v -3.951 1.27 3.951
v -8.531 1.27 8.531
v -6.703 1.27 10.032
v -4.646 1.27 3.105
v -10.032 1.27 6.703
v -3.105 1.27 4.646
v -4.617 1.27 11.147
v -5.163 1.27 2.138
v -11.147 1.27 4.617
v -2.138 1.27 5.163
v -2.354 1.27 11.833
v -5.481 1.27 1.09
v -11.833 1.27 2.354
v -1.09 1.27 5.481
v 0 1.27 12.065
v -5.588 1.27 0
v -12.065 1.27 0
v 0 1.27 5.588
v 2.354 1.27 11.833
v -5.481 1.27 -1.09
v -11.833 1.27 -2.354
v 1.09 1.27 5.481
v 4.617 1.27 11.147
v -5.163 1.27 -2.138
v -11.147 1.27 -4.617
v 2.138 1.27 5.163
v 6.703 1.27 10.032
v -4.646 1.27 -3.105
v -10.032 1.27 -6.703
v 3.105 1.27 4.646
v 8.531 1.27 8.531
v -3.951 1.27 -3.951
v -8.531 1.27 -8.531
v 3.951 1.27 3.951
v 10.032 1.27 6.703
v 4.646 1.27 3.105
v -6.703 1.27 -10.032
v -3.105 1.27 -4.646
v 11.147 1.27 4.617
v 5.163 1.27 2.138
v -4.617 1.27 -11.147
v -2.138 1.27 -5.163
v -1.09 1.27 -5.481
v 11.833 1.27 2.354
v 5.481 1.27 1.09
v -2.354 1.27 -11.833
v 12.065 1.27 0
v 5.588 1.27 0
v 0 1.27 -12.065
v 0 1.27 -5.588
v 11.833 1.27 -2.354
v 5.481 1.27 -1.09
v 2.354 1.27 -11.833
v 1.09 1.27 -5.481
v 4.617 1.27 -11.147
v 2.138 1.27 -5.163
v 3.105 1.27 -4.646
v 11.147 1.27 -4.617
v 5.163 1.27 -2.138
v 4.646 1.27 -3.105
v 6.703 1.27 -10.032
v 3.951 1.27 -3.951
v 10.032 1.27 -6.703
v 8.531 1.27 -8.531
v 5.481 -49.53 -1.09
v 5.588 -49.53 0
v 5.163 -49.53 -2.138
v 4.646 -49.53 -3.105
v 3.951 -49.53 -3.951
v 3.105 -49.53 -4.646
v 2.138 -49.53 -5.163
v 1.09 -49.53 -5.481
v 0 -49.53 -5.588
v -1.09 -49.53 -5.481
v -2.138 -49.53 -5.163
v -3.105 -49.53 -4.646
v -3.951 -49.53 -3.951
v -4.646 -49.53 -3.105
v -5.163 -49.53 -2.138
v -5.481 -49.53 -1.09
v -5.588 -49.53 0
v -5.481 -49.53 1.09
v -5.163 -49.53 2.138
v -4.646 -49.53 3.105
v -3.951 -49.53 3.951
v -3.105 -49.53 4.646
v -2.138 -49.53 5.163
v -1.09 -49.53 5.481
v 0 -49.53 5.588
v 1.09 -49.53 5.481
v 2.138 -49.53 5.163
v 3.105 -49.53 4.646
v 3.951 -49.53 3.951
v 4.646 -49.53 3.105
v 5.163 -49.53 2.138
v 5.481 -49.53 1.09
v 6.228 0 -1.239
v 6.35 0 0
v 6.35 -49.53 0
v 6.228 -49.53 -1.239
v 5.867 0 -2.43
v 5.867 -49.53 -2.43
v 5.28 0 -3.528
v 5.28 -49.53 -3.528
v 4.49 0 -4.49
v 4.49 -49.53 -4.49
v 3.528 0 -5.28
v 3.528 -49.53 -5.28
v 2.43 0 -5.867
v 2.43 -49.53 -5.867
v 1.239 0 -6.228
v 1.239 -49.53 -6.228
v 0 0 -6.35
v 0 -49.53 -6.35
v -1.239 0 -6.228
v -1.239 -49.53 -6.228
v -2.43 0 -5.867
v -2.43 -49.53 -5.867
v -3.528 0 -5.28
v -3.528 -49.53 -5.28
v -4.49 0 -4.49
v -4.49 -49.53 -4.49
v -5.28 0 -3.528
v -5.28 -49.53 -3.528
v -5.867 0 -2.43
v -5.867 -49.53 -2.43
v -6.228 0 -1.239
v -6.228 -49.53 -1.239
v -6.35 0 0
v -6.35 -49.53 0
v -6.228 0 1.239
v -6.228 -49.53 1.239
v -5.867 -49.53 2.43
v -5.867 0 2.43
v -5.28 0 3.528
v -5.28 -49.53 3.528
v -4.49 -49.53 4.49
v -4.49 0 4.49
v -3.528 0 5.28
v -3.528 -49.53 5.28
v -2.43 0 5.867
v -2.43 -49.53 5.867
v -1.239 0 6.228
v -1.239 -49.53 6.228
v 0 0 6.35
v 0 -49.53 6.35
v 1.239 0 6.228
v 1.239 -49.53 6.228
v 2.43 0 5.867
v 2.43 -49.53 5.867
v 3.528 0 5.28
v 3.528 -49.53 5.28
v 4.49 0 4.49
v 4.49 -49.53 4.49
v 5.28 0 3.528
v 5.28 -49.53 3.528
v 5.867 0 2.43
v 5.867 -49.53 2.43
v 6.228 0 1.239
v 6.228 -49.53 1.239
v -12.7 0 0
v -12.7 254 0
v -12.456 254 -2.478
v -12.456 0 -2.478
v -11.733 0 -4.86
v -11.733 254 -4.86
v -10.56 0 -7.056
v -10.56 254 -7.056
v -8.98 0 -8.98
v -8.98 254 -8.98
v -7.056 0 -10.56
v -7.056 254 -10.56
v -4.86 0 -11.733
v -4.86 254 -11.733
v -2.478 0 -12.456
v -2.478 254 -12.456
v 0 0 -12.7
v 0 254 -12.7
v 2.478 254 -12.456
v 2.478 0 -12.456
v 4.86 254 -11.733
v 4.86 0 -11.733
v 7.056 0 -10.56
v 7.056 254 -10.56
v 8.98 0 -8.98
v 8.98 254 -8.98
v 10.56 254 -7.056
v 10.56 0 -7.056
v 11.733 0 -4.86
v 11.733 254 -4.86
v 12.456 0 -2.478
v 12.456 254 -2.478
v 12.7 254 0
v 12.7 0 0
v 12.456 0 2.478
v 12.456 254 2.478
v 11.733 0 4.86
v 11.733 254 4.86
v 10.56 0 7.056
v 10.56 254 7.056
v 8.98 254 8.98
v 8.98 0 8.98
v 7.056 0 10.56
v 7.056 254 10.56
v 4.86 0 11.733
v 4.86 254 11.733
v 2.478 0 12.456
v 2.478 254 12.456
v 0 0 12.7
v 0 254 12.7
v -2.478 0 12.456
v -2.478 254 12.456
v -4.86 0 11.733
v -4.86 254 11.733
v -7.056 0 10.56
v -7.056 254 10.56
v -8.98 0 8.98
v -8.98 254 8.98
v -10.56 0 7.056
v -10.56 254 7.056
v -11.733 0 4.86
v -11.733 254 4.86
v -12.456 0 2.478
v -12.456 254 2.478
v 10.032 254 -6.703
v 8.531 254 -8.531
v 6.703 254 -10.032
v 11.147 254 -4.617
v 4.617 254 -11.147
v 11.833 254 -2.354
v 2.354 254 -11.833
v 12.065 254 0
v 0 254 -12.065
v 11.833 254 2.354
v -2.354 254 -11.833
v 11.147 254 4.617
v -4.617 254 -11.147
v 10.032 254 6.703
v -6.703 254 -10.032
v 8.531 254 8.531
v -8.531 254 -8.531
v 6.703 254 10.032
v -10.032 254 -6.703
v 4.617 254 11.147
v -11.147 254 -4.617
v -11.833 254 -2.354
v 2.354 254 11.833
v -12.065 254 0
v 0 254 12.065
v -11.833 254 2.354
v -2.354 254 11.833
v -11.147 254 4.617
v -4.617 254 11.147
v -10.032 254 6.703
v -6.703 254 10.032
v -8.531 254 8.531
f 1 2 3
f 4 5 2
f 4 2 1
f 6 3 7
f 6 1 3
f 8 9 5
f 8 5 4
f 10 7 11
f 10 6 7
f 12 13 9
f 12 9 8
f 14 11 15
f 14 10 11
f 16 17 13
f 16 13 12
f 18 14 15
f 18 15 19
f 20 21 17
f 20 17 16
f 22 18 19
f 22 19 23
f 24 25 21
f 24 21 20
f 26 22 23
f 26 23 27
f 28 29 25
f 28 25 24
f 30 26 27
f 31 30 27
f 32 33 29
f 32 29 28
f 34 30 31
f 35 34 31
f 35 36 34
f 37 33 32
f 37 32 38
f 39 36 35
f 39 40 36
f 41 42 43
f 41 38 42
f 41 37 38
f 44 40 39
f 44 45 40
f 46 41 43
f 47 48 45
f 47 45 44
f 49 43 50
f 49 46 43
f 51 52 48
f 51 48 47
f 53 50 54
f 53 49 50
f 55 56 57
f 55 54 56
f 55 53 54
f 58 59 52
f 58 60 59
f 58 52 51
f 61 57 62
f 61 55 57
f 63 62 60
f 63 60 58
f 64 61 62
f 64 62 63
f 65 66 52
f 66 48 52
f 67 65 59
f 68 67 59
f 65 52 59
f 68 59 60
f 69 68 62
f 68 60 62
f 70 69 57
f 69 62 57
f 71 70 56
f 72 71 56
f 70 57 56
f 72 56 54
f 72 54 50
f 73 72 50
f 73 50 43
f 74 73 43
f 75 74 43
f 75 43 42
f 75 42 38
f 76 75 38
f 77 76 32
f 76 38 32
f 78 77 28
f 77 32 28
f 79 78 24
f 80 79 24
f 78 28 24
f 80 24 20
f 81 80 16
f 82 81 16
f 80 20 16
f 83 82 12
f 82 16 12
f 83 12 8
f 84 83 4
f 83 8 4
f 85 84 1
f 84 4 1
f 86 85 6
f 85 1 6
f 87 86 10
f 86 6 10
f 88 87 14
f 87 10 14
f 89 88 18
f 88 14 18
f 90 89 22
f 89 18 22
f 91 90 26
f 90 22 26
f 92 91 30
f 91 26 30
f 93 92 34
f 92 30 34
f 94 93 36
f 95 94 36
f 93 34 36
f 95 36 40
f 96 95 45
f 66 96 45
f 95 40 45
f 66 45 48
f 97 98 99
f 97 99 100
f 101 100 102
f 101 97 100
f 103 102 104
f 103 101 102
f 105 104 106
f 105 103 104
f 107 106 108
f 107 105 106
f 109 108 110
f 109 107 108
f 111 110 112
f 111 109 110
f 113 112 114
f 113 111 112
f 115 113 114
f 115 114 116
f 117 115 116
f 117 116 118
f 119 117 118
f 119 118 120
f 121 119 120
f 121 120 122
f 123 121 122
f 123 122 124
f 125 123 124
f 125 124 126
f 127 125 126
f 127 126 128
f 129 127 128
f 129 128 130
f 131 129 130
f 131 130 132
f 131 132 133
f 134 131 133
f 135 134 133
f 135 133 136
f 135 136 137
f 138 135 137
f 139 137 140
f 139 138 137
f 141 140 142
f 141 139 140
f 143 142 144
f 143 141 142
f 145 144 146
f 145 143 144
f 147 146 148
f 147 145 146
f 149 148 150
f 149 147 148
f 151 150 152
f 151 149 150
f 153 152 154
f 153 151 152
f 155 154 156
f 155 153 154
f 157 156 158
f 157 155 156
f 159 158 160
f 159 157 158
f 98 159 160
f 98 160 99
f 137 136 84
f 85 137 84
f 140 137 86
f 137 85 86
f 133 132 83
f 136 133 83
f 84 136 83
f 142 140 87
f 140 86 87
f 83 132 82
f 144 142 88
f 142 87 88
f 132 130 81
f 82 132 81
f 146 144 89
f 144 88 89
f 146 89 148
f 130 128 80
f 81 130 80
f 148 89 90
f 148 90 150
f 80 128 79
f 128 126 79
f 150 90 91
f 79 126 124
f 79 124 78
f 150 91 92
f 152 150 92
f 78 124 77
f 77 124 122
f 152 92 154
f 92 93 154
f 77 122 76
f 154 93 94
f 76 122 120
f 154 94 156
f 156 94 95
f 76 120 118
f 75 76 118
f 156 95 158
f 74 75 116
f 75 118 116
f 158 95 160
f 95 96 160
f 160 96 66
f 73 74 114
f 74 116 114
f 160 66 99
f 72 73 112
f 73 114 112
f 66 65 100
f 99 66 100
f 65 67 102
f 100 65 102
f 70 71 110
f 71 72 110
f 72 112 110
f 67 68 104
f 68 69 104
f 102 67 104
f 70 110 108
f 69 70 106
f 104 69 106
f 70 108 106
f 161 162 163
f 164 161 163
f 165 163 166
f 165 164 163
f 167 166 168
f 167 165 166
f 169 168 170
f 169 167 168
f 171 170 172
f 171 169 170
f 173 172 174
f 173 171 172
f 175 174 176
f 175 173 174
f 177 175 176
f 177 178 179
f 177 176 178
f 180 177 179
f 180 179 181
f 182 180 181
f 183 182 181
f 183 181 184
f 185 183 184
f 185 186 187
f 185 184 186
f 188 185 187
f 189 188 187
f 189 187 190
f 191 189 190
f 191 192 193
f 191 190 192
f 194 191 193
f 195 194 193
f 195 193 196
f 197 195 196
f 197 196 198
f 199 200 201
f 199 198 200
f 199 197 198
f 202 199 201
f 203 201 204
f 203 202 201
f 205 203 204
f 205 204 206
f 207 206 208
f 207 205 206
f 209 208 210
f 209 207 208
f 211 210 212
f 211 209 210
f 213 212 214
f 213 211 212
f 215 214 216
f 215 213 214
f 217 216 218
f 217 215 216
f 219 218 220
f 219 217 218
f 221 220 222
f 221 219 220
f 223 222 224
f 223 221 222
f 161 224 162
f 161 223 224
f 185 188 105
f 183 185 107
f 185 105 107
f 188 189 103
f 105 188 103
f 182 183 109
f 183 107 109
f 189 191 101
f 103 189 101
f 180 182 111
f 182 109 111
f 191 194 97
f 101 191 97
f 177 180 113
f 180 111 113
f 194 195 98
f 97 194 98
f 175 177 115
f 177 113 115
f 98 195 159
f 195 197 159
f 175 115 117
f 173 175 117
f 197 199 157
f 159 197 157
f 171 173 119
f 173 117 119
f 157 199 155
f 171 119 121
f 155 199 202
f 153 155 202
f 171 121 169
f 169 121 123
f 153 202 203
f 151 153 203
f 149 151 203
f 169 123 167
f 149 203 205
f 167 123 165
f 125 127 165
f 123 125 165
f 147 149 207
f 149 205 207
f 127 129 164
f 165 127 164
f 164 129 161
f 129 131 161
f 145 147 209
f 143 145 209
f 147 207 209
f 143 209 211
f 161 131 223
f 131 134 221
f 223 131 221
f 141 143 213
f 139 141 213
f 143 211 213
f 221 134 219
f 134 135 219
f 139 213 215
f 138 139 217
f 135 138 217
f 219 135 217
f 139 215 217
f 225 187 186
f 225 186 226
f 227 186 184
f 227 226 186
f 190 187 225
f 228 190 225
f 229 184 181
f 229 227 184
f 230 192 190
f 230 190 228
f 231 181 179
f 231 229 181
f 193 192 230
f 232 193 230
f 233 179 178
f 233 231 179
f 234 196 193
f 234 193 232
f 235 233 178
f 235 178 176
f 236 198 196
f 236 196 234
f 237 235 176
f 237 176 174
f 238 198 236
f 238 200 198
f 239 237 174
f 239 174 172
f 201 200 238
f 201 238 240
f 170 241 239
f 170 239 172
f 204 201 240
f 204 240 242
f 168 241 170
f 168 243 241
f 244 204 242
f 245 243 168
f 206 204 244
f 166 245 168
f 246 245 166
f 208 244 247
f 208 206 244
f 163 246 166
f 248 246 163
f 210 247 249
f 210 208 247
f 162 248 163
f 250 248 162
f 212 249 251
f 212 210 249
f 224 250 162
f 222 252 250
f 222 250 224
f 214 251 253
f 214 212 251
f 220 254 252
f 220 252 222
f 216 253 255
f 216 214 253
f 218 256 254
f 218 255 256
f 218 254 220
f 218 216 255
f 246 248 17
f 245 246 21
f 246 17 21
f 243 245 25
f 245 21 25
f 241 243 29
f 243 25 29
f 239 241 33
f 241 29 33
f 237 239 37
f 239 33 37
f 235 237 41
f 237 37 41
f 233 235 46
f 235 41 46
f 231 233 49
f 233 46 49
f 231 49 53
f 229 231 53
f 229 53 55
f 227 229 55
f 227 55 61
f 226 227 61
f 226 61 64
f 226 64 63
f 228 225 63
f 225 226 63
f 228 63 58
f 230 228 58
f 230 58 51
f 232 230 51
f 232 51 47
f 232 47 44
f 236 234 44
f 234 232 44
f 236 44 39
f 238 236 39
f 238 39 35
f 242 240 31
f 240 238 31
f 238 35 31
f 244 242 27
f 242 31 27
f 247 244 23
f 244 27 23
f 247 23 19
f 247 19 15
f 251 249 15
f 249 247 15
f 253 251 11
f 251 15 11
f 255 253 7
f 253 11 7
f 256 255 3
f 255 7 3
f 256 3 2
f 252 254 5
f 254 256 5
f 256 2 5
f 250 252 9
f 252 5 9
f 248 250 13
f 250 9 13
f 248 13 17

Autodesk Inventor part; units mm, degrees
ref_plane "YZ Plane" through (0, 0, 0) normal (1, 0, 0) x (0, 1, 0)
ref_plane "XZ Plane" through (0, 0, 0) normal (0, 1, 0) x (-1, 0, 0)
ref_plane "XY Plane" through (0, 0, 0) normal (0, 0, 1) x (1, 0, 0)
sketch "Sketch1" plane through (0, 0, 0) normal (0, 1, 0) x (-1, 0, 0)
  circle A0 centre (0, 0) radius 12.7
  circle A1 centre (0, 0) radius 12.065
  dimension "d0" = 25.4
  dimension "d1" = 24.13
extrude "Extrusion1" add sketch "Sketch1" along normal blind 254
sketch "Sketch2" plane through (0, 0, 0) normal (0, -1, 0) x (1, 0, 0)
  circle A0 centre (0, 0) radius 12.065
  circle A1 centre (0, 0) radius 12.065 projected
  circle A2 centre (0, 0) radius 6.35
  dimension "d4" = 12.7
extrude "Extrusion2" add sketch "Sketch2" against normal blind 1.27
sketch "Sketch3" plane through (0, 1.27, 0) normal (0, 1, 0) x (1, 0, 0)
  circle A0 centre (0, 0) radius 6.35
  circle A1 centre (0, 0) radius 5.588
  dimension "d7" = 12.7
  dimension "d8" = 11.176
extrude "Extrusion3" add sketch "Sketch3" against normal blind 50.8
properties part number "1in ss pipe" material "Stainless Steel"
